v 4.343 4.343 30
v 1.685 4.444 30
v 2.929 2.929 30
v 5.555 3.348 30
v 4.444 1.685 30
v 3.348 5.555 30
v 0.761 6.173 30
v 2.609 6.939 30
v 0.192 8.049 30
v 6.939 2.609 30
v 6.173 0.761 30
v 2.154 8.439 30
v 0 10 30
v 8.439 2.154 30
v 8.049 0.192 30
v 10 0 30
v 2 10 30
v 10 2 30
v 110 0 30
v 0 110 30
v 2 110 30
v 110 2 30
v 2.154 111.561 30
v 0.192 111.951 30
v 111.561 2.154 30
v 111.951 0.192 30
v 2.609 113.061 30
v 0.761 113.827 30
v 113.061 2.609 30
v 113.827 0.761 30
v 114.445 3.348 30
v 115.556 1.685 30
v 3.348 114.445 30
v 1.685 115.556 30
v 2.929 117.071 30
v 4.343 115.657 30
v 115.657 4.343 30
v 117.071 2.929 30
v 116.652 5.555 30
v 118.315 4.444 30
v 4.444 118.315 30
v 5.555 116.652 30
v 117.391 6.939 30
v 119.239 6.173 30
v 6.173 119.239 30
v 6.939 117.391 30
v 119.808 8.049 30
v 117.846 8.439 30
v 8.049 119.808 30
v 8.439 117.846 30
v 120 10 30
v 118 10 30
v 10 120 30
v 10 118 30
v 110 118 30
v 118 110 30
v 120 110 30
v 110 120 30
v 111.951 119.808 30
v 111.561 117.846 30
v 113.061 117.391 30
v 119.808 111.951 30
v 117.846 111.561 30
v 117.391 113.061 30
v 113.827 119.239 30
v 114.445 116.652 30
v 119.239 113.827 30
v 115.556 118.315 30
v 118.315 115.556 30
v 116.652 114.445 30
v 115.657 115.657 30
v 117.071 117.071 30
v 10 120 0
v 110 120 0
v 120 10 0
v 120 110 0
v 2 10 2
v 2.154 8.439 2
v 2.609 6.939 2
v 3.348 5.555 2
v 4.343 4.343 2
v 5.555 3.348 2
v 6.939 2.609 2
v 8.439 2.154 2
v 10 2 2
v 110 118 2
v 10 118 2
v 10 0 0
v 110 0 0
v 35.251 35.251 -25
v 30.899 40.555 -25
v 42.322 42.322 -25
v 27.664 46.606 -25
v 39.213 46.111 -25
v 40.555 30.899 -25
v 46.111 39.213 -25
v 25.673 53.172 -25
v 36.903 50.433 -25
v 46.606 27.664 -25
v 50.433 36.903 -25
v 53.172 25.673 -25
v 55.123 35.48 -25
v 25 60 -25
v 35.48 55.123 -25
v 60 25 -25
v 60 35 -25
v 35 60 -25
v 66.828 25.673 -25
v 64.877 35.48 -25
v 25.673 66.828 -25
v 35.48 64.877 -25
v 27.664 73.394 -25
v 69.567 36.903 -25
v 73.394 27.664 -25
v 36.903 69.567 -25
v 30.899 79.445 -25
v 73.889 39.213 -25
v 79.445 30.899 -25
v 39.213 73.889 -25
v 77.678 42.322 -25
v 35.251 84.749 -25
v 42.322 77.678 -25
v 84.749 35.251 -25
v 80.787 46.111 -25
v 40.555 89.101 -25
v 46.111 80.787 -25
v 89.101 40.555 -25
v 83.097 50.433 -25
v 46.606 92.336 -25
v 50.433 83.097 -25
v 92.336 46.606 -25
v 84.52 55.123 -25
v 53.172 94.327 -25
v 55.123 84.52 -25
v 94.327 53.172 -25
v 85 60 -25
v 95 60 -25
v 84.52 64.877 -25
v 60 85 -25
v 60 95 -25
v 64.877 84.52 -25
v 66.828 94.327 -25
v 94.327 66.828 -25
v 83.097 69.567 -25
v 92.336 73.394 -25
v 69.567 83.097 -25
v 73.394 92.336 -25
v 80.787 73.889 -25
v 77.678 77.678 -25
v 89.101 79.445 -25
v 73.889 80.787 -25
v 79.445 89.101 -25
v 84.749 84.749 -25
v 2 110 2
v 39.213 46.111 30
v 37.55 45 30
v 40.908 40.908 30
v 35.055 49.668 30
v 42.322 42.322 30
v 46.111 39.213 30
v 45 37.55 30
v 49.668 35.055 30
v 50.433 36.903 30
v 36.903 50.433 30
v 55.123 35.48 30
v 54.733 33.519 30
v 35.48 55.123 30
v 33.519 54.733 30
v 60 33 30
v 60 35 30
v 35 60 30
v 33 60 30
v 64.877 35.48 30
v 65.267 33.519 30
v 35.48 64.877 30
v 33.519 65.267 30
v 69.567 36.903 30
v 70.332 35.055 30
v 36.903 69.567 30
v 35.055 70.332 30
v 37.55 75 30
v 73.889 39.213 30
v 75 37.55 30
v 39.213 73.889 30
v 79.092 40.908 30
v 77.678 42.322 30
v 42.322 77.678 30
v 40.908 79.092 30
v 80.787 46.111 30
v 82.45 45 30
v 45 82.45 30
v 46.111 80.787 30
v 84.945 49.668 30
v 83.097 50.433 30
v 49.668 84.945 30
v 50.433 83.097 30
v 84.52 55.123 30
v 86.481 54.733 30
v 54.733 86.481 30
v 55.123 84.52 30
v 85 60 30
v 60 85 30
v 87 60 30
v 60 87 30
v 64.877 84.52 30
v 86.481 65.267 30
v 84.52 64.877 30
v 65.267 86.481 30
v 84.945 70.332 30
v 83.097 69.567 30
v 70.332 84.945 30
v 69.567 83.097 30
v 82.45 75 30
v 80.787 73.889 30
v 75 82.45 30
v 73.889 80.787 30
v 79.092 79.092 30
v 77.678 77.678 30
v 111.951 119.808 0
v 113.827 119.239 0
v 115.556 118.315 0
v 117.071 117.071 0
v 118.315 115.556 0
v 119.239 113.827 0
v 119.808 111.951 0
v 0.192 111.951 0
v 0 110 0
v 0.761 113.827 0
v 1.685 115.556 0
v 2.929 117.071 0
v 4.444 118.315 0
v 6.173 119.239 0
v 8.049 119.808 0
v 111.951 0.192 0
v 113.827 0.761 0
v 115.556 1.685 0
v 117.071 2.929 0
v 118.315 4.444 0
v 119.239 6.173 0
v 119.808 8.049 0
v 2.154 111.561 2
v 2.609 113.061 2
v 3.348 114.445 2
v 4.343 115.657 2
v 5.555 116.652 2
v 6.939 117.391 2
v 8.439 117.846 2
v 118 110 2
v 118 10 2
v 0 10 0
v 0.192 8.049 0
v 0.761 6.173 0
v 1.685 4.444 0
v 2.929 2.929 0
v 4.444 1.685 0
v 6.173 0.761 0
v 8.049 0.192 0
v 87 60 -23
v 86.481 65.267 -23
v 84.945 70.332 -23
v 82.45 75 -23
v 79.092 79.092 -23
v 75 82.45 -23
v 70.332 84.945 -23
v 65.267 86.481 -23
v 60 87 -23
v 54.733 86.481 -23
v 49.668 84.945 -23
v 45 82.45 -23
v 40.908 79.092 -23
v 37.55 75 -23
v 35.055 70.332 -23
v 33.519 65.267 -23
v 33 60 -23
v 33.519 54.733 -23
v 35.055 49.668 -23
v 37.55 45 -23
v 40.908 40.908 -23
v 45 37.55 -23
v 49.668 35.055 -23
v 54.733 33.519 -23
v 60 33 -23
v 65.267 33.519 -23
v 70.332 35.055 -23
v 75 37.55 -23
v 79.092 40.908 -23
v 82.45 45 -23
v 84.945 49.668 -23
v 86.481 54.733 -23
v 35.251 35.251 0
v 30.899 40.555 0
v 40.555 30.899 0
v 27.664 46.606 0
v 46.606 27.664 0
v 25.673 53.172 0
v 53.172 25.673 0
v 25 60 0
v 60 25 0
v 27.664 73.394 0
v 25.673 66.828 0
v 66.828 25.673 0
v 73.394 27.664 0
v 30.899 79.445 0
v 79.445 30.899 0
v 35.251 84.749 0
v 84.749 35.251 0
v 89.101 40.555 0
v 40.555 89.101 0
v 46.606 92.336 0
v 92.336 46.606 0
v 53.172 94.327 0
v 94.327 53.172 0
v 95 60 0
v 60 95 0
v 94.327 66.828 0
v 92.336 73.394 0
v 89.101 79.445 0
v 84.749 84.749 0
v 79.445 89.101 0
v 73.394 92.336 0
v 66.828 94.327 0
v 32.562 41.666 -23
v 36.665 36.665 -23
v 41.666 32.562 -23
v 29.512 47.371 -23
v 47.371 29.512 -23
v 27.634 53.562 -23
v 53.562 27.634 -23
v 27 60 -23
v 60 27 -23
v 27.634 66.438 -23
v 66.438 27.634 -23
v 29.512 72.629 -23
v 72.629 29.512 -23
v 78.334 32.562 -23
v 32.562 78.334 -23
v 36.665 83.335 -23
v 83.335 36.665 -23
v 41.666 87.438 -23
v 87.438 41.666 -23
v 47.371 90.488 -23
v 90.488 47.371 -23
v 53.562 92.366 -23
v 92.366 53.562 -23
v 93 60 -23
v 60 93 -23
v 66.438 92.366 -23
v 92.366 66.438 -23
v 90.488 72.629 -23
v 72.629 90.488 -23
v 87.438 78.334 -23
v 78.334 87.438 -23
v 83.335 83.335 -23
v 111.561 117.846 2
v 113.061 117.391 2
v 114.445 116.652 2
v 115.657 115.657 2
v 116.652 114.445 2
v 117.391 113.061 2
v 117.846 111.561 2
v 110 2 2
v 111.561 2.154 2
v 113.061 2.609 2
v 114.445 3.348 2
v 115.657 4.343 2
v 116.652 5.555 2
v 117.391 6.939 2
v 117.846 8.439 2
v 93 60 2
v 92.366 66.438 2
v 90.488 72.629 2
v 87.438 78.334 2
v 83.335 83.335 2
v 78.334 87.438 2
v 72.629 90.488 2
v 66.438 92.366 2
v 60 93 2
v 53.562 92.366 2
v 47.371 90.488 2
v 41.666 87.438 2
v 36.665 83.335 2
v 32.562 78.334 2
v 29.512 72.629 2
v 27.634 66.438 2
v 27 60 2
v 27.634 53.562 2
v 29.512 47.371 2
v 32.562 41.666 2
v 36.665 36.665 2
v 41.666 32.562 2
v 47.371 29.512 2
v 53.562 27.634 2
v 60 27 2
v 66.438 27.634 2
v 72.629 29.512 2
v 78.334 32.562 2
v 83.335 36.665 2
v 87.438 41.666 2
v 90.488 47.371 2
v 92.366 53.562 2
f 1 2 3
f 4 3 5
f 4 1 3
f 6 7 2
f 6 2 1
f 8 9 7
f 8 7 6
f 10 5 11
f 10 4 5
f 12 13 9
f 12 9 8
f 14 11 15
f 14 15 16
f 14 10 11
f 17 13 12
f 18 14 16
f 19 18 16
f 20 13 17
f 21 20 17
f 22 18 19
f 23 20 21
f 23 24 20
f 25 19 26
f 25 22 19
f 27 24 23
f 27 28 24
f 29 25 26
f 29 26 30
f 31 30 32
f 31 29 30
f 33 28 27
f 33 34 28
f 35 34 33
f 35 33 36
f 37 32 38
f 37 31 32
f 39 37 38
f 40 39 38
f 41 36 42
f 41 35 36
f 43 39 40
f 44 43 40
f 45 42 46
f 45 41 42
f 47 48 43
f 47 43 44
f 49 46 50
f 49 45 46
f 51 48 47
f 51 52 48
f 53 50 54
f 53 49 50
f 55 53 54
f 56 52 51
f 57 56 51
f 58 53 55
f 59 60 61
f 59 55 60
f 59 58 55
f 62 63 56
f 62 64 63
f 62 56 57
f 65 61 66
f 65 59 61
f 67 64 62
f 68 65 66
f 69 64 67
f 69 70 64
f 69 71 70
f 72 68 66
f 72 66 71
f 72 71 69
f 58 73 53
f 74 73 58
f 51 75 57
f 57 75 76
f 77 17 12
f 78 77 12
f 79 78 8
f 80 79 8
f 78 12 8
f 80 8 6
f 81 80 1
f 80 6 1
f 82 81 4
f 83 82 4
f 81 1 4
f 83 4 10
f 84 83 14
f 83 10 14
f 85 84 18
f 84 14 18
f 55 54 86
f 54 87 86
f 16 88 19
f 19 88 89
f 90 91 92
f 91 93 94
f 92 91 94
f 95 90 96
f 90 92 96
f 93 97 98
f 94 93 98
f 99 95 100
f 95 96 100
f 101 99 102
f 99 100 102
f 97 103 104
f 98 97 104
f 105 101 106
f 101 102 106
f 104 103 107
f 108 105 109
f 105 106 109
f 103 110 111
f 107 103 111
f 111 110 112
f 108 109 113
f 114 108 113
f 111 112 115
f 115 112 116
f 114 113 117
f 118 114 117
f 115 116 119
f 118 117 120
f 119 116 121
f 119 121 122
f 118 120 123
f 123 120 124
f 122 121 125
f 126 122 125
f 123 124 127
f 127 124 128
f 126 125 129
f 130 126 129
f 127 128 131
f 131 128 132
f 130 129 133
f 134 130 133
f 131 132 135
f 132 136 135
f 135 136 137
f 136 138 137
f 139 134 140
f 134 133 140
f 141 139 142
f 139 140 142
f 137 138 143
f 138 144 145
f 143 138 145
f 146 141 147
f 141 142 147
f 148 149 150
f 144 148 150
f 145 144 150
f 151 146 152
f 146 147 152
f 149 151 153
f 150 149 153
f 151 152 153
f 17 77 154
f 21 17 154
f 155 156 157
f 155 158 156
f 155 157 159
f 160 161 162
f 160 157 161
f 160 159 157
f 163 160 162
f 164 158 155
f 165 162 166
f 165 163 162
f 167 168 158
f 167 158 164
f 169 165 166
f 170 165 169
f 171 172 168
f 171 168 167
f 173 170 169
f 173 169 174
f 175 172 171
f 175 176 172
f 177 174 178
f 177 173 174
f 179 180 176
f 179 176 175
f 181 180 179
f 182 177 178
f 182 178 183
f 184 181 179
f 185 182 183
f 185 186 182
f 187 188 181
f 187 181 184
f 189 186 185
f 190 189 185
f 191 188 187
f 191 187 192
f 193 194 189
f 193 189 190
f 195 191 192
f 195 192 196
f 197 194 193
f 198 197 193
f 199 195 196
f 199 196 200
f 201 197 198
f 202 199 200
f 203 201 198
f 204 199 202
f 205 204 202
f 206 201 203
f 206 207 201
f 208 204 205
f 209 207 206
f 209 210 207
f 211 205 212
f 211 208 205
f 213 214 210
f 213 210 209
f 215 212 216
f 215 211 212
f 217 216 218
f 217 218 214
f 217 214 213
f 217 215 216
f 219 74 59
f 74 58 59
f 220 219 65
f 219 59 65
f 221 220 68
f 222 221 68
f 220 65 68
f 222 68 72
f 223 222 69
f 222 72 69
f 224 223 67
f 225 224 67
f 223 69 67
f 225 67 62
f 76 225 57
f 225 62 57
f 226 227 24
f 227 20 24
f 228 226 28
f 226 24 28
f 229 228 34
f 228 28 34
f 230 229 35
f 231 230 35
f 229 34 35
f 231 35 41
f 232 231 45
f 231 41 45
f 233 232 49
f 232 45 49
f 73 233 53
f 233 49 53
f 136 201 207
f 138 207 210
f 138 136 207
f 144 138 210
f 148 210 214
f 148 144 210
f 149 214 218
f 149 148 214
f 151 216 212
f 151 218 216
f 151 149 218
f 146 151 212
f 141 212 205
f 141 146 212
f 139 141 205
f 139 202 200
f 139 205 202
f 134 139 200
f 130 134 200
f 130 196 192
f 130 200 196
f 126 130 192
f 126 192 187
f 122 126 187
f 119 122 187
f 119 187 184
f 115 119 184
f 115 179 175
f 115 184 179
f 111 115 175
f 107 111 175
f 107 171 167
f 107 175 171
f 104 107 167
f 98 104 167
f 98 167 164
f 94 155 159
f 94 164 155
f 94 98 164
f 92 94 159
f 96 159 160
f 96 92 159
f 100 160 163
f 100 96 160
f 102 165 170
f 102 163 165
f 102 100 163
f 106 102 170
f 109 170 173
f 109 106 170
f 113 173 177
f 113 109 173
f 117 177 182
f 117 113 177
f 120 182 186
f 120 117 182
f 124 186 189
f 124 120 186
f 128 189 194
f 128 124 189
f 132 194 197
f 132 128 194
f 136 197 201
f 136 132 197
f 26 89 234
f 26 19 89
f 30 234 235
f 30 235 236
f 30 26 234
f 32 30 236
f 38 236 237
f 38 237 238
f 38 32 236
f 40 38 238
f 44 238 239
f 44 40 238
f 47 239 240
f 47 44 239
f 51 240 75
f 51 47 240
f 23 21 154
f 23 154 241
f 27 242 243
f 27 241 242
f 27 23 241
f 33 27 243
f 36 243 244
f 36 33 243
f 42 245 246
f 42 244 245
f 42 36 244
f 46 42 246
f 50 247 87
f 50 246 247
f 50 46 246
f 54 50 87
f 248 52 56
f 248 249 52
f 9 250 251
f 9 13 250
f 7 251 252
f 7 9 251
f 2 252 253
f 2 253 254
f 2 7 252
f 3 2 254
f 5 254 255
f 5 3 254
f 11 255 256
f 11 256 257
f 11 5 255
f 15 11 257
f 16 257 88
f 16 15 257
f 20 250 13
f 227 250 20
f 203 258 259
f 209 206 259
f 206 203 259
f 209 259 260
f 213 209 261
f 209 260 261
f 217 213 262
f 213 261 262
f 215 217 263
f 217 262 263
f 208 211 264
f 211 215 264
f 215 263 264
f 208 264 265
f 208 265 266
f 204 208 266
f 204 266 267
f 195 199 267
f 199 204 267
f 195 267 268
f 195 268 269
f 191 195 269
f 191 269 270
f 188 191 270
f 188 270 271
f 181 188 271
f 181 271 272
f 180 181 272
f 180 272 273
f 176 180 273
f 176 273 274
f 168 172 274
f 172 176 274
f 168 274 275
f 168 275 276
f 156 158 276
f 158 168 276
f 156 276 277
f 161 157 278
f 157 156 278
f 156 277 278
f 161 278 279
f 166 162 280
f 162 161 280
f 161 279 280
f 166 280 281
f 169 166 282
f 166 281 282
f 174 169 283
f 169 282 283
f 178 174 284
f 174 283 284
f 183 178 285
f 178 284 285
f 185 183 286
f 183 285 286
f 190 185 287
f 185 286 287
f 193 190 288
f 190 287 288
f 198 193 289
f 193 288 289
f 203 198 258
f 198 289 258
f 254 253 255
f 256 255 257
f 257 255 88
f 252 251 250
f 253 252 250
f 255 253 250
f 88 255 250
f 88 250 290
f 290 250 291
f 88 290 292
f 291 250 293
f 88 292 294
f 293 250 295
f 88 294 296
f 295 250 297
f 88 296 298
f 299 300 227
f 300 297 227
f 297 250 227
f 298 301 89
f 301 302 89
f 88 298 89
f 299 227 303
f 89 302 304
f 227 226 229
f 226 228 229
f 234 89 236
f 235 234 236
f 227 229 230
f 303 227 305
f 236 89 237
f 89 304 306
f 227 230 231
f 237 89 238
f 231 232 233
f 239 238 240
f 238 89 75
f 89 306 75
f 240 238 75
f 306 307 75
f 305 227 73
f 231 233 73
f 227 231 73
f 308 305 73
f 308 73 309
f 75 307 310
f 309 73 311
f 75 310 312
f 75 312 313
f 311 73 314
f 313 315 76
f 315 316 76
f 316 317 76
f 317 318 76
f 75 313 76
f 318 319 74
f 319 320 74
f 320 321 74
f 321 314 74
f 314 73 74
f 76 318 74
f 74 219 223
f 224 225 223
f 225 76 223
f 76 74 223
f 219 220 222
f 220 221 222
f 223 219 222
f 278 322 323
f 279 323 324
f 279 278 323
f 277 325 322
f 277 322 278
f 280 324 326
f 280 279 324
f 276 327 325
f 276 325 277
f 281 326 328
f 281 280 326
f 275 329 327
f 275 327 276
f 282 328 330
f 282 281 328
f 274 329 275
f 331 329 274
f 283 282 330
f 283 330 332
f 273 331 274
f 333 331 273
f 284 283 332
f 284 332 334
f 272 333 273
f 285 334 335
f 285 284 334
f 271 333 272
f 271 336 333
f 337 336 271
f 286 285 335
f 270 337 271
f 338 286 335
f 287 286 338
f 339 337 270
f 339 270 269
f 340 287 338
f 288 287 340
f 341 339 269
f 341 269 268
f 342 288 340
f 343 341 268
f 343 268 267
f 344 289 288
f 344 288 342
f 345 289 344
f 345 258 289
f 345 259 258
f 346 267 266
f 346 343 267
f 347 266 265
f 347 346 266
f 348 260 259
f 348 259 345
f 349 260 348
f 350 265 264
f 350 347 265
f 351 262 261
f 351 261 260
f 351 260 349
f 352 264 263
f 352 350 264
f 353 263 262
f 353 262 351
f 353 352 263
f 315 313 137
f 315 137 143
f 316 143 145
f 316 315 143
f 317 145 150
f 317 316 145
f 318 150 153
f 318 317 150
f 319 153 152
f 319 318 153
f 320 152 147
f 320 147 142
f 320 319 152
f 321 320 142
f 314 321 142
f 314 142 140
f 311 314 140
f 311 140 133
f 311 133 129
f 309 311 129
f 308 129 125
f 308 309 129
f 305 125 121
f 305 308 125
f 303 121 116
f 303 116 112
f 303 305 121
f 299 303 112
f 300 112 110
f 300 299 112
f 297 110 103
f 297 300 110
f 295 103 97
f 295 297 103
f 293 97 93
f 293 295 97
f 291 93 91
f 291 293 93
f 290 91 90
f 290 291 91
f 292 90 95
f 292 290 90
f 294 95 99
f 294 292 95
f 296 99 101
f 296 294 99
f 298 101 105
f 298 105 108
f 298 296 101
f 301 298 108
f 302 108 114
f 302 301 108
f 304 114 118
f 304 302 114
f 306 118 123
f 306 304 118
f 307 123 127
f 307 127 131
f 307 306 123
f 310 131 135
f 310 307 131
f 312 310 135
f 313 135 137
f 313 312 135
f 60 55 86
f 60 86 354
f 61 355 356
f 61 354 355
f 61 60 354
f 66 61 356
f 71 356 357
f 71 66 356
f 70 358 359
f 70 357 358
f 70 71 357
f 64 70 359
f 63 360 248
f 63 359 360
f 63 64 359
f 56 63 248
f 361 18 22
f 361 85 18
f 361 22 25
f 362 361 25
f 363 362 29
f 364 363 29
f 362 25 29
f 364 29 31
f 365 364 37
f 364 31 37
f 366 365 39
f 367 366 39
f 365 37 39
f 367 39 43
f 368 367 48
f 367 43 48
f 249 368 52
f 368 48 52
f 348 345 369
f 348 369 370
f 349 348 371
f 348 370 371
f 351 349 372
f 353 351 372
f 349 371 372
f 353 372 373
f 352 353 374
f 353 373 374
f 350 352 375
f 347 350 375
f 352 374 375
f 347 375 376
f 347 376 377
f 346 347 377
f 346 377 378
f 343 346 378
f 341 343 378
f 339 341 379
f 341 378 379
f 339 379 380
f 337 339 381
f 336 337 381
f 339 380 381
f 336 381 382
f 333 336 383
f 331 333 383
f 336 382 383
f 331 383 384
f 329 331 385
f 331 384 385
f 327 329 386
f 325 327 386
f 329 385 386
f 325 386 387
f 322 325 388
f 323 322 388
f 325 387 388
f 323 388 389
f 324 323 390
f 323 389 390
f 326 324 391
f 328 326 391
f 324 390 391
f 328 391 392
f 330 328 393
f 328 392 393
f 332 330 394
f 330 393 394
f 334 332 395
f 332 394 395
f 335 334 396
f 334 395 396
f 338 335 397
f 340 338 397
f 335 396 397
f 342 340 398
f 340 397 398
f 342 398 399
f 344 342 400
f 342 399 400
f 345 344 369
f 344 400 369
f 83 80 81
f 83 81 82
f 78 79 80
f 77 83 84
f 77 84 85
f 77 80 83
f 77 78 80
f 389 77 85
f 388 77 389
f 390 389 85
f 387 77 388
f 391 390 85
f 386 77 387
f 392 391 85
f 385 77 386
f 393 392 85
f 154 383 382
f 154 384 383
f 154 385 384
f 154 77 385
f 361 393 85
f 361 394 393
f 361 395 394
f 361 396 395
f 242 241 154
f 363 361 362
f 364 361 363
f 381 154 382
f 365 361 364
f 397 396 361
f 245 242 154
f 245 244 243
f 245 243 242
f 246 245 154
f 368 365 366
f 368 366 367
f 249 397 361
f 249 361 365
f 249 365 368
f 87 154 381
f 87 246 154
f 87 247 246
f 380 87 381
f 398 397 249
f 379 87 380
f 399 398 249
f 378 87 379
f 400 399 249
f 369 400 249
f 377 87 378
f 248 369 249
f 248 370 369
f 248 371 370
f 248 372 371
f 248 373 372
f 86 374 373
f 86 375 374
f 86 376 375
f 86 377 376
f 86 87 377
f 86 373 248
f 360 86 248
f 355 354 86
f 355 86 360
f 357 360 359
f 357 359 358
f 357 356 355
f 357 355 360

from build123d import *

# Parameters (mm, degrees)
SKETCH1_W               = 120
SKETCH1_H               = 120
BOSS_EXTRUDE3_DEPTH     = 30
SKETCH5_R               = 35
BOSS_EXTRUDE5_DEPTH     = 25
CUT_EXTRUDE3_DEPTH      = 75
CUT_EXTRUDE3_DEPTH_BACK = 67
SKETCH7_R               = 25
FILLET3_R               = 10
SHELL1_T                = -2


with BuildPart() as part:
    # Sketch1 → Boss-Extrude3 (new body)
    with BuildSketch(Plane.XY):
        with Locations((60, 60)):
            Rectangle(SKETCH1_W, SKETCH1_H)
    extrude(amount=BOSS_EXTRUDE3_DEPTH)

    # Sketch5 → Boss-Extrude5 (add)
    with BuildSketch(Plane.XY):
        with Locations((60, 60)):
            Circle(SKETCH5_R)
    extrude(amount=-BOSS_EXTRUDE5_DEPTH)

    # Sketch7 → Cut-Extrude3 (cut, two sides: drawn at the far end of the back side and taken through both)
    with BuildSketch(Plane.XY.offset(-CUT_EXTRUDE3_DEPTH_BACK)):
        with Locations((60, 60)):
            Circle(SKETCH7_R)
    extrude(amount=CUT_EXTRUDE3_DEPTH + CUT_EXTRUDE3_DEPTH_BACK, mode=Mode.SUBTRACT)

    # Fillet3
    fillet3_edges = [part.edges().sort_by_distance(p)[0] for p in [
        (0, 120, 15),
        (120, 120, 15),
        (120, 0, 15),
        (0, 0, 15),
    ]]
    fillet(fillet3_edges, radius=FILLET3_R)

    # Shell1
    shell1_openings = [part.faces().sort_by_distance(p)[0] for p in [
        (60, 1.697056275, 30),
    ]]
    offset(amount=SHELL1_T, openings=shell1_openings, kind=Kind.INTERSECTION)


solid = part.part
